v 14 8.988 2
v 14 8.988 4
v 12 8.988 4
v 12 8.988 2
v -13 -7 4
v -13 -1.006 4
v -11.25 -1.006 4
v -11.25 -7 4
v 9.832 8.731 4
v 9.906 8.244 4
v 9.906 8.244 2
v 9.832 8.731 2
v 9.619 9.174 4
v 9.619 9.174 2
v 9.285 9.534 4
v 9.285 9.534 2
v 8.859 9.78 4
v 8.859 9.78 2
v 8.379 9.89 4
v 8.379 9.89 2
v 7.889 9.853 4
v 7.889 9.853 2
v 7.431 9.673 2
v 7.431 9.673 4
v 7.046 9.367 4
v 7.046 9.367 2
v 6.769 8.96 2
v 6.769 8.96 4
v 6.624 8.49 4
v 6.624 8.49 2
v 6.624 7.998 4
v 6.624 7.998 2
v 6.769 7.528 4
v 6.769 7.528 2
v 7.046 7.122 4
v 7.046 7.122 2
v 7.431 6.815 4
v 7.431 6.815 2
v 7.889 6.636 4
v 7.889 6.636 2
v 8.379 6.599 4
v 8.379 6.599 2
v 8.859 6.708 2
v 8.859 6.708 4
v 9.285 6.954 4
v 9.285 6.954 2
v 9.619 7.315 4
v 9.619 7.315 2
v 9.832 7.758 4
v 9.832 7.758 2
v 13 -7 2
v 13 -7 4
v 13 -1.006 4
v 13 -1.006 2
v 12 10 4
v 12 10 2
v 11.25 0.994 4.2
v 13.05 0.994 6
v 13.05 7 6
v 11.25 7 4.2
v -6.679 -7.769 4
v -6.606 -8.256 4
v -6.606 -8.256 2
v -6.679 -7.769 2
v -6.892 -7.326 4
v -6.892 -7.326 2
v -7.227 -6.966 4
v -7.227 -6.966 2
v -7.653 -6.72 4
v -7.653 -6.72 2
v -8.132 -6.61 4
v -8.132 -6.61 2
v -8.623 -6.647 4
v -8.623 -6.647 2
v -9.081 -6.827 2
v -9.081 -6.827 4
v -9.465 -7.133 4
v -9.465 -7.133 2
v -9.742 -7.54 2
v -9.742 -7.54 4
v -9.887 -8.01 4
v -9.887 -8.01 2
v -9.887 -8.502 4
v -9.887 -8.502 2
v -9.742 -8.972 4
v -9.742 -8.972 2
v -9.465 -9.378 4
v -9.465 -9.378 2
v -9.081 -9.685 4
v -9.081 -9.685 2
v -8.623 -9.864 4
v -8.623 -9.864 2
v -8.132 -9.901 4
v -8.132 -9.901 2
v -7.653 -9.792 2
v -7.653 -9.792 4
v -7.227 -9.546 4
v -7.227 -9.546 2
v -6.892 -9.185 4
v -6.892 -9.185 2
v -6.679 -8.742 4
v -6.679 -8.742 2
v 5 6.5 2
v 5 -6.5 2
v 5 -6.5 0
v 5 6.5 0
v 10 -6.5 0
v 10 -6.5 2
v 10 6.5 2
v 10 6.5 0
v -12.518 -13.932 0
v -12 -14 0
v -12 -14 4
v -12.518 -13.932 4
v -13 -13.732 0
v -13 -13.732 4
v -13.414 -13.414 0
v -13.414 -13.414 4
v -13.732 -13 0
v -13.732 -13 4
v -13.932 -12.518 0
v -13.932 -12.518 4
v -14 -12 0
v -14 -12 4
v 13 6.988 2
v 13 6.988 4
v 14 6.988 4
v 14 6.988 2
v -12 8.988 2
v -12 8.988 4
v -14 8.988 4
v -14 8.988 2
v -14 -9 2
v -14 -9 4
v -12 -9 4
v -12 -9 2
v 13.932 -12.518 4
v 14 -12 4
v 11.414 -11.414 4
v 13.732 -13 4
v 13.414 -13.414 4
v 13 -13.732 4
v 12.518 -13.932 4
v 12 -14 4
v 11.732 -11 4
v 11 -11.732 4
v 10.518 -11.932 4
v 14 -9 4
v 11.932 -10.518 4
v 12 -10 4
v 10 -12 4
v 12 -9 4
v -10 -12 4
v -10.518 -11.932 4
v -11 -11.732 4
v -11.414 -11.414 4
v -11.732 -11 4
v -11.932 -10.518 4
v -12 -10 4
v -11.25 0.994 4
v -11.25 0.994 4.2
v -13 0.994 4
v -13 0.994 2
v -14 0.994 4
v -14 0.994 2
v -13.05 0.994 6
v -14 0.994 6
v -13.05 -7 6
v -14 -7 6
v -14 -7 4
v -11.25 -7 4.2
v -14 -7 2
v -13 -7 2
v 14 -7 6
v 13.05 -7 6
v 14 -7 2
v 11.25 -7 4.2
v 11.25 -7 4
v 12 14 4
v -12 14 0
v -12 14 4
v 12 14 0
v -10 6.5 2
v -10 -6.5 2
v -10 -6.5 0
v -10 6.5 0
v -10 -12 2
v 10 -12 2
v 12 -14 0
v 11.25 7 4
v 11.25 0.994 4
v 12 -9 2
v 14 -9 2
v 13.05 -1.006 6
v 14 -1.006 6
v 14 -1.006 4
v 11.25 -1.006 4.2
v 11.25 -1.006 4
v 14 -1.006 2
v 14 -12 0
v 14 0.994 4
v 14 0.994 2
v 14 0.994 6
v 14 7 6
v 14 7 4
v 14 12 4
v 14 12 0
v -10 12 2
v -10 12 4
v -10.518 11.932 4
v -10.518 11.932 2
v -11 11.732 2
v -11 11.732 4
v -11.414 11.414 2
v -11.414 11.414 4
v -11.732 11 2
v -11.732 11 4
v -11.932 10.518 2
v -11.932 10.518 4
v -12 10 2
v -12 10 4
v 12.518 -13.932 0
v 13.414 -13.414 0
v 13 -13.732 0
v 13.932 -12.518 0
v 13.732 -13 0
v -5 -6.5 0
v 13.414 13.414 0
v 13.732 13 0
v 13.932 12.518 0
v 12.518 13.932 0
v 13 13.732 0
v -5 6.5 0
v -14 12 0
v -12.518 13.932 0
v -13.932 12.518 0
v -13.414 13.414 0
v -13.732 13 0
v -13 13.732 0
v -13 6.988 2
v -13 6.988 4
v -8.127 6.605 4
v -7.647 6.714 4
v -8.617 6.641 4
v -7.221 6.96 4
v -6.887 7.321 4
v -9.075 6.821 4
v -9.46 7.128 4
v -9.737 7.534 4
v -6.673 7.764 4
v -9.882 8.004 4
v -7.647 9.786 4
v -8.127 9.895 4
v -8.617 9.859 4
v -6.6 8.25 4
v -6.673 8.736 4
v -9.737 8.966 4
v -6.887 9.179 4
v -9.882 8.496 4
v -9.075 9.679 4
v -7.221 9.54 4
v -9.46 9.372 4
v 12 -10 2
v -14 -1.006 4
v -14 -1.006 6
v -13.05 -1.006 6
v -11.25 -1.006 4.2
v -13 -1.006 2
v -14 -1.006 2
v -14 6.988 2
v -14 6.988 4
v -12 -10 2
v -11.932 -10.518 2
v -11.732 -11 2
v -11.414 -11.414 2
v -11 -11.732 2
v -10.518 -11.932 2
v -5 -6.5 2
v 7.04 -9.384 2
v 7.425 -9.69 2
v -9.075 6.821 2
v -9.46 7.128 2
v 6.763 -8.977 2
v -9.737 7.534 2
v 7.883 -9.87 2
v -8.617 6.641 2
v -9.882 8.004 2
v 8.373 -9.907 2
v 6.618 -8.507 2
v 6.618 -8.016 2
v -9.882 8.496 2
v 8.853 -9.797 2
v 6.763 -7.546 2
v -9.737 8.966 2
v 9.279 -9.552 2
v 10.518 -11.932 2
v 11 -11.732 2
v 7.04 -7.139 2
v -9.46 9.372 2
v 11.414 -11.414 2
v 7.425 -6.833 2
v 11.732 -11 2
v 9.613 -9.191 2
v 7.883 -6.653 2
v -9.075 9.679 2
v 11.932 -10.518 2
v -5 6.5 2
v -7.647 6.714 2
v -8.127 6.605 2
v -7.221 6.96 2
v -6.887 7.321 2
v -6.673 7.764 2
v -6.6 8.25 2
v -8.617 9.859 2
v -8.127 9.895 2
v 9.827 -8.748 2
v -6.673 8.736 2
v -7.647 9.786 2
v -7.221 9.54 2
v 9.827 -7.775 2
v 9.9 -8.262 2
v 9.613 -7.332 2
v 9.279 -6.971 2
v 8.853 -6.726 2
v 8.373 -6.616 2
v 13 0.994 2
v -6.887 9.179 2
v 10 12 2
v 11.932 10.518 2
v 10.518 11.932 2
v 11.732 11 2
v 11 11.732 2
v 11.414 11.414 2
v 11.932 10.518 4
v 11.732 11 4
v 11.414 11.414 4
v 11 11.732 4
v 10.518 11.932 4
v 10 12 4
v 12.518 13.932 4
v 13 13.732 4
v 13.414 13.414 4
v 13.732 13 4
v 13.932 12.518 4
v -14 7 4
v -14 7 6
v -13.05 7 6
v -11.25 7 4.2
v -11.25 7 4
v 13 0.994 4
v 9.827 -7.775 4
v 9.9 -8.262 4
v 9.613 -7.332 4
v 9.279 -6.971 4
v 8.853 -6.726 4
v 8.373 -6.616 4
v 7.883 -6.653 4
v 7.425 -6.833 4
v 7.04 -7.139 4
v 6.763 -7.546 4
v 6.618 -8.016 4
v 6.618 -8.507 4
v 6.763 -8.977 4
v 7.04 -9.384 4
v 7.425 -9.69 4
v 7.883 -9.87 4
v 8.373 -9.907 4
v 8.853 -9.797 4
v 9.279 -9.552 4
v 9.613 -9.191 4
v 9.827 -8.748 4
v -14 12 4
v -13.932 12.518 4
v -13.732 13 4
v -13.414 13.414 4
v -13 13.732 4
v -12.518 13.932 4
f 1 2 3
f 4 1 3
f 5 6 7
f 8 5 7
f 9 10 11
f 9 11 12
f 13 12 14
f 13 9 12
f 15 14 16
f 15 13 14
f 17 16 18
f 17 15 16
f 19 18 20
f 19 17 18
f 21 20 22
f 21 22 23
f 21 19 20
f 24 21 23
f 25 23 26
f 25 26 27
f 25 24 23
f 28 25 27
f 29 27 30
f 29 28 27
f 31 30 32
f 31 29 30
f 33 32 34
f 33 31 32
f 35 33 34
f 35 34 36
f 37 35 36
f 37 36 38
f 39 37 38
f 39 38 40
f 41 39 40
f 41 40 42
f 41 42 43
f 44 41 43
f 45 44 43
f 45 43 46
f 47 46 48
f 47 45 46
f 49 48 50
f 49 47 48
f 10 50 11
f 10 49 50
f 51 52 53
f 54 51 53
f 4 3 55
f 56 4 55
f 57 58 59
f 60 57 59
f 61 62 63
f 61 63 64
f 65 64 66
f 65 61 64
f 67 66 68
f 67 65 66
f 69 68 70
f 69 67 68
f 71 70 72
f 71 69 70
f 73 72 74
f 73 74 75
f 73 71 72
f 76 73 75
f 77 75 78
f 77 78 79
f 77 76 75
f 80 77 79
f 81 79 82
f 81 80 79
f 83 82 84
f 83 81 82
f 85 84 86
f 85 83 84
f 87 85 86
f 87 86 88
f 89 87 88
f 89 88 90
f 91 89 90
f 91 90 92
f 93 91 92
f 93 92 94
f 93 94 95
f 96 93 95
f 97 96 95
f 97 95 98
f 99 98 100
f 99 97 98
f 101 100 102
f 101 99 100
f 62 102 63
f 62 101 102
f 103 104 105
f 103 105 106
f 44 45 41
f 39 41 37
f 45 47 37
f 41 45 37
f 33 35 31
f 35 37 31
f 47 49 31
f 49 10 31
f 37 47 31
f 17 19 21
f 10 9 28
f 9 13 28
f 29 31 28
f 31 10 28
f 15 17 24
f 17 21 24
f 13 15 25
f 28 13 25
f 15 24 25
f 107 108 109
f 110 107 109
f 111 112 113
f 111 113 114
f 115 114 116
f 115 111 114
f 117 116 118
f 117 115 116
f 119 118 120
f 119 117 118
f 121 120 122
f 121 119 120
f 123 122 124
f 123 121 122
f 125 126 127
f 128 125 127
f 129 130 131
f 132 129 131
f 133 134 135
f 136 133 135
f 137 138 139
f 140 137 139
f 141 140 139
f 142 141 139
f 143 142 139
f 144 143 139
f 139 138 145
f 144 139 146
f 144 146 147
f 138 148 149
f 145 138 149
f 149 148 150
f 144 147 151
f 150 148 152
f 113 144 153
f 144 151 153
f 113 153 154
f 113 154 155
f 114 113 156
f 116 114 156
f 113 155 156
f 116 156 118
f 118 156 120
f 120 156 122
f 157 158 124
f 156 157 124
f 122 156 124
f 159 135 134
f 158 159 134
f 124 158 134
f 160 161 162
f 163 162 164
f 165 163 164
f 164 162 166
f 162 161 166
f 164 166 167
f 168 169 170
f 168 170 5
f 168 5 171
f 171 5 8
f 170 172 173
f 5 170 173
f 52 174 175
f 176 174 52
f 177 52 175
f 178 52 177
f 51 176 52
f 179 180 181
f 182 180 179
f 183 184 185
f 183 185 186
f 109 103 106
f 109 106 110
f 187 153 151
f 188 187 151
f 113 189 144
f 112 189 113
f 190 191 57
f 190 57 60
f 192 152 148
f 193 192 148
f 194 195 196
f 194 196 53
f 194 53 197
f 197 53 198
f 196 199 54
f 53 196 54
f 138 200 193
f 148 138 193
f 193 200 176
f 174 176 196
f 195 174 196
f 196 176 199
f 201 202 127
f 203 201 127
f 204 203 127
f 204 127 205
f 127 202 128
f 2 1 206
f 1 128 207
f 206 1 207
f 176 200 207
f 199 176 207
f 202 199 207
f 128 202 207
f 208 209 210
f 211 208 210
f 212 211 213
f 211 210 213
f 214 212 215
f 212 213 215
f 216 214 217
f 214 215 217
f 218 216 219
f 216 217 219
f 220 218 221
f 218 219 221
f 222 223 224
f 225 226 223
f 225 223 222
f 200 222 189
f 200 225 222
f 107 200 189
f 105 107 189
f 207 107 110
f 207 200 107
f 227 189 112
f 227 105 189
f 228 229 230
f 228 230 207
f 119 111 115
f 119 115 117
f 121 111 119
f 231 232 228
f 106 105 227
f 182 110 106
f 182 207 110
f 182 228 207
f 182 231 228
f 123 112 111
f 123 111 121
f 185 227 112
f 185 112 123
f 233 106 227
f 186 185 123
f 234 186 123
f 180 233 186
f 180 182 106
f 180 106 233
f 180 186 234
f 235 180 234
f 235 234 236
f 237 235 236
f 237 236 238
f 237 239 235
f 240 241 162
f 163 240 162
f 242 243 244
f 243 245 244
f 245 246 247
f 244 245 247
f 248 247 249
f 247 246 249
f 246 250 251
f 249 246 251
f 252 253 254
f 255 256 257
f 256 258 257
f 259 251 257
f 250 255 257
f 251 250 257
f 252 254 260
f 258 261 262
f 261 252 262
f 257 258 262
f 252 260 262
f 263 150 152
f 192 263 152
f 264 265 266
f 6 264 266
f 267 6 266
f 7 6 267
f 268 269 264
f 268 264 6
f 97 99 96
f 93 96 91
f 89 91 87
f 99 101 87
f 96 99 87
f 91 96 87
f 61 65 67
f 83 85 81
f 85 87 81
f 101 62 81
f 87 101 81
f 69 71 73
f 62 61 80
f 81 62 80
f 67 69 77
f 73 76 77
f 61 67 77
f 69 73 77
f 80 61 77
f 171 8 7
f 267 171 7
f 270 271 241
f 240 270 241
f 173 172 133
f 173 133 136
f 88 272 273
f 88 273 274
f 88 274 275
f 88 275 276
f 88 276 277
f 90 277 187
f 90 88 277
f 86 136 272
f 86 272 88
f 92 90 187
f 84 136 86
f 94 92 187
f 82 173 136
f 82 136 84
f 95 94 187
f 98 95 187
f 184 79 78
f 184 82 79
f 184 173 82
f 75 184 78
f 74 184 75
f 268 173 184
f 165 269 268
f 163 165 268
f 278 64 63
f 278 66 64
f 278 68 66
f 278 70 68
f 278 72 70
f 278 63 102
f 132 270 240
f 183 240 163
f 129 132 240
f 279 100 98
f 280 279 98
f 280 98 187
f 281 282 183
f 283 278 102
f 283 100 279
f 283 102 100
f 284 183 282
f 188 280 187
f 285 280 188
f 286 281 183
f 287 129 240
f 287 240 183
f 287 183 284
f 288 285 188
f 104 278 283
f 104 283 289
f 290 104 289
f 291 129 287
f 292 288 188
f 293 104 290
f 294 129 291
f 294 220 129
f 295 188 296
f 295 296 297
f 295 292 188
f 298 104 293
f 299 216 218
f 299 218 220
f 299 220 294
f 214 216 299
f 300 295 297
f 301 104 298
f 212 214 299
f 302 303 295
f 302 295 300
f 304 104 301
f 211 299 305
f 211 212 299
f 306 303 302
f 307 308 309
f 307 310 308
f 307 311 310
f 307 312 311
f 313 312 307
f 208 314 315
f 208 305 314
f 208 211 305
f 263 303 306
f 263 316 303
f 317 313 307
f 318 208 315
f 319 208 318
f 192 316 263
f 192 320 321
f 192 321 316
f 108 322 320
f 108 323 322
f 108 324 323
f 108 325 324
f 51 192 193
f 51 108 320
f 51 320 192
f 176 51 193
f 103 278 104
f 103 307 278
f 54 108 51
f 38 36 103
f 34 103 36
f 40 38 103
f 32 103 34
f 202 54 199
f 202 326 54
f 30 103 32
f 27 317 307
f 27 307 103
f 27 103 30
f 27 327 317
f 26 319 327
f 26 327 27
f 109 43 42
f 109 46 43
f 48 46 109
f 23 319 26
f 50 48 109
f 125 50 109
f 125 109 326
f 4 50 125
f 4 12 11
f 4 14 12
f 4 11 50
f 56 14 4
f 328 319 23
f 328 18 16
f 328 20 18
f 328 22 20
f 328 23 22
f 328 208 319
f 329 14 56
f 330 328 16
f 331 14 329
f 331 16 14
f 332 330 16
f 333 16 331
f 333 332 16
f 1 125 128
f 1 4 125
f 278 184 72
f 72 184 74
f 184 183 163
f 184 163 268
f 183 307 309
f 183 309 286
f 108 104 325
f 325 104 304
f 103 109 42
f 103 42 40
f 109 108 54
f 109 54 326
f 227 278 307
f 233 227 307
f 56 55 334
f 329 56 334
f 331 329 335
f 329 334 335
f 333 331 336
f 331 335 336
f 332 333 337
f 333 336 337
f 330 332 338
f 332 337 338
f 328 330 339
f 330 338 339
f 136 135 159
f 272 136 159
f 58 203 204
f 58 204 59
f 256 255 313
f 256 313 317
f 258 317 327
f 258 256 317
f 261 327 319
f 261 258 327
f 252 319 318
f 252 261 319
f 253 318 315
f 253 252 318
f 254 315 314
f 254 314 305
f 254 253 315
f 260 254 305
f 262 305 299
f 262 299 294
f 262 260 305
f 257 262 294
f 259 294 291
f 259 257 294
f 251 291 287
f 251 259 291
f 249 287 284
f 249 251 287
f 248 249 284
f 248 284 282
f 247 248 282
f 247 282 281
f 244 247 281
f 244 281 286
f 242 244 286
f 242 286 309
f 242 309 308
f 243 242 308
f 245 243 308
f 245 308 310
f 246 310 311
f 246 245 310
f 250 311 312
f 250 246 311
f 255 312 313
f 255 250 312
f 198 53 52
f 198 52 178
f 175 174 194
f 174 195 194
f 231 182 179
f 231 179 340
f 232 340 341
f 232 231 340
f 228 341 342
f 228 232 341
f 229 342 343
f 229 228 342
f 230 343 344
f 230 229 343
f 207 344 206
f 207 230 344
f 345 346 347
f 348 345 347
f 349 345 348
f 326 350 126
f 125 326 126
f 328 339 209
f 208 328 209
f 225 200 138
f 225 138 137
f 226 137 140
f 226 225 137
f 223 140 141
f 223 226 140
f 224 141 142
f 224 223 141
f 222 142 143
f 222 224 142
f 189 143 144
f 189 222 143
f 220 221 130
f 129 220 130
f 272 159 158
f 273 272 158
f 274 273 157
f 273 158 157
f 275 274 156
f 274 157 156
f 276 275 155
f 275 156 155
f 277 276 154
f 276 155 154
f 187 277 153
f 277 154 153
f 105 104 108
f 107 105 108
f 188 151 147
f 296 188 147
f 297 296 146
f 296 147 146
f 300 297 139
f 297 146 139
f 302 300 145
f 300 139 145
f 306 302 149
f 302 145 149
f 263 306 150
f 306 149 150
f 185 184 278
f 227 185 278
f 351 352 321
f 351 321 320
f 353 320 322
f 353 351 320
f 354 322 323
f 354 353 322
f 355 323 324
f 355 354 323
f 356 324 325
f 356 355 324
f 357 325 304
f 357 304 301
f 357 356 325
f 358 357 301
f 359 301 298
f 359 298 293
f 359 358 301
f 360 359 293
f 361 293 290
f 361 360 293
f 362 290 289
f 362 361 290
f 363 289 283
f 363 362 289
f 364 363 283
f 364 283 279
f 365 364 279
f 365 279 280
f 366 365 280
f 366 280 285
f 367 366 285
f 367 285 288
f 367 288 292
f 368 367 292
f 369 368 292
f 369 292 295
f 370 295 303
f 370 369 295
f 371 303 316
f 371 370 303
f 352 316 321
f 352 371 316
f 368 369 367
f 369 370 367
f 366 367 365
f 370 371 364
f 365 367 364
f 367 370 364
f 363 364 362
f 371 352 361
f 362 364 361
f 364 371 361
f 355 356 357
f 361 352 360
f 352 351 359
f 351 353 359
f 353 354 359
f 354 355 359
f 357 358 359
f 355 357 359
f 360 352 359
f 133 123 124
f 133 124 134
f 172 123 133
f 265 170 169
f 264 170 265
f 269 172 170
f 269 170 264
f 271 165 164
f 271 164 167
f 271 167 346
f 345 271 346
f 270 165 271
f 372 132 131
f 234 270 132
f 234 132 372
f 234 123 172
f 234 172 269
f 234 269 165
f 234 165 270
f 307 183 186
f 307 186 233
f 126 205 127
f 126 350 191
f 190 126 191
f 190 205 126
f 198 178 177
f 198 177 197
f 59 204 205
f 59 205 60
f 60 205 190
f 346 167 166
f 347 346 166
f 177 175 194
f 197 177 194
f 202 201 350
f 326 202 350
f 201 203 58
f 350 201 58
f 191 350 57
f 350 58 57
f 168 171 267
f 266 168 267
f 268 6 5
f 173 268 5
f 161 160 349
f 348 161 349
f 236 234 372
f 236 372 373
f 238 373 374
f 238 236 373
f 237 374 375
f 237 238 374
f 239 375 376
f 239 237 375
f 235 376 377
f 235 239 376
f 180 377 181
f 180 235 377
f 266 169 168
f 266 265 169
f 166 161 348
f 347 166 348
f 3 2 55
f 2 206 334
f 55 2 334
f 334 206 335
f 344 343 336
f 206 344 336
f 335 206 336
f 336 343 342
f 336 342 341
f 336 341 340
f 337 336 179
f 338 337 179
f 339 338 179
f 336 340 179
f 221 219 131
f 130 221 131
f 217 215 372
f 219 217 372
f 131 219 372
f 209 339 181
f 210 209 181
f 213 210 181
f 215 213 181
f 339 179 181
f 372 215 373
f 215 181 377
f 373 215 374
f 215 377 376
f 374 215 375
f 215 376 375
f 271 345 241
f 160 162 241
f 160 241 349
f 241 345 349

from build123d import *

# Parameters (mm, degrees)
BOSS_EXTRU_1_DEPTH           = 4
ESQUISSE2_R                  = 1.65
ENL_V_MAT_EXTRU_1_DEPTH      = 2
ESQUISSE3_W                  = 5
ESQUISSE3_H                  = 13
ENL_V_MAT_EXTRU_2_DEPTH      = 20.899748742
ESQUISSE4_W                  = 2.75
ESQUISSE4_H                  = 5.994249795
ESQUISSE4_H_2                = 6.005750205
BOSS_EXTRU_2_DEPTH           = 2
CHANFREIN3_SIZE              = 1.8
CHANFREIN3_OF_SYM_TRIE1_SIZE = 1.8


with BuildPart() as part:
    # Esquisse1 → Boss.-Extru.1 (new body)
    with BuildSketch(Plane.XY):
        with BuildLine():
            Line((12, -14), (-12, -14))
            ThreePointArc((-12, -14), (-13.414213562, -13.414213562), (-14, -12))
            Line((-14, -12), (-14, 12))
            ThreePointArc((-14, 12), (-13.414213562, 13.414213562), (-12, 14))
            Line((-12, 14), (12, 14))
            ThreePointArc((12, 14), (13.414213562, 13.414213562), (14, 12))
            Line((14, 12), (14, -12))
            ThreePointArc((14, -12), (13.414213562, -13.414213562), (12, -14))
        make_face()
    extrude(amount=BOSS_EXTRU_1_DEPTH)

    # Esquisse2 → Enlèv. mat.-Extru.1 (cut)
    with BuildSketch(Plane.XY.offset(4)):
        with BuildLine():
            Line((-10, -12), (10, -12))
            ThreePointArc((10, -12), (11.414213562, -11.414213562), (12, -10))
            Line((12, -10), (12, -9))
            Line((12, -9), (14, -9))
            Line((14, -9), (14, -7))
            Line((14, -7), (13, -7))
            Line((13, -7), (13, -1.005750205))
            Line((13, -1.005750205), (14, -1.005750205))
            Line((14, -1.005750205), (14, 0.994249795))
            Line((14, 0.994249795), (13, 0.994249795))
            Line((13, 0.994249795), (13, 6.988499589))
            Line((13, 6.988499589), (14, 6.988499589))
            Line((14, 6.988499589), (14, 8.988499589))
            Line((14, 8.988499589), (12, 8.988499589))
            Line((12, 8.988499589), (12, 10))
            ThreePointArc((12, 10), (11.414213562, 11.414213562), (10, 12))
            Line((10, 12), (-10, 12))
            ThreePointArc((-10, 12), (-11.414213562, 11.414213562), (-12, 10))
            Line((-12, 10), (-12, 8.988499589))
            Line((-12, 8.988499589), (-14, 8.988499589))
            Line((-14, 8.988499589), (-14, 6.988499589))
            Line((-14, 6.988499589), (-13, 6.988499589))
            Line((-13, 6.988499589), (-13, 0.994249795))
            Line((-13, 0.994249795), (-14, 0.994249795))
            Line((-14, 0.994249795), (-14, -1.005750205))
            Line((-14, -1.005750205), (-13, -1.005750205))
            Line((-13, -1.005750205), (-13, -7))
            Line((-13, -7), (-14, -7))
            Line((-14, -7), (-14, -9))
            Line((-14, -9), (-12, -9))
            Line((-12, -9), (-12, -10))
            ThreePointArc((-12, -10), (-11.414213562, -11.414213562), (-10, -12))
        make_face()
        with Locations((-8.25, 8.25)):
            Circle(ESQUISSE2_R, mode=Mode.SUBTRACT)
        with Locations((8.255750205, 8.244249795)):
            Circle(ESQUISSE2_R, mode=Mode.SUBTRACT)
        with Locations((8.25, -8.261500411)):
            Circle(ESQUISSE2_R, mode=Mode.SUBTRACT)
        with Locations((-8.255750205, -8.255750205)):
            Circle(ESQUISSE2_R, mode=Mode.SUBTRACT)
    extrude(amount=-ENL_V_MAT_EXTRU_1_DEPTH, mode=Mode.SUBTRACT)

    # Esquisse3 → Enlèv. mat.-Extru.2 (cut, through all)
    with BuildSketch(Plane.XY.offset(2)):
        with Locations((-7.5, 0)):
            Rectangle(ESQUISSE3_W, ESQUISSE3_H)
        with Locations((7.5, 0)):
            Rectangle(ESQUISSE3_W, ESQUISSE3_H)
    extrude(amount=-ENL_V_MAT_EXTRU_2_DEPTH, mode=Mode.SUBTRACT)

    # Esquisse4 → Boss.-Extru.2 (add)
    with BuildSketch(Plane.XY.offset(4)):
        with Locations((-12.625, -4.002875103)):
            Rectangle(ESQUISSE4_W, ESQUISSE4_H)
        with Locations((-12.625, 3.997124897)):
            Rectangle(ESQUISSE4_W, ESQUISSE4_H_2)
    boss_extru_2 = extrude(amount=BOSS_EXTRU_2_DEPTH)

    # Chanfrein3
    chanfrein3_edges = [part.edges().sort_by_distance(p)[0] for p in [
        (-11.25, 3.997124897, 6),
        (-11.25, -4.002875103, 6),
    ]]
    chamfer(chanfrein3_edges, length=CHANFREIN3_SIZE)

    # Symétrie1: Boss.-Extru.2 across plane
    add(boss_extru_2.mirror(Plane(origin=(0, 0, 0), x_dir=(0, 0, 1), z_dir=(1, 0, 0))))

    # Chanfrein3 of Symétrie1
    chanfrein3_of_sym_trie1_edges = [part.edges().sort_by_distance(p)[0] for p in [
        (11.25, 3.997124897, 6),
        (11.25, -4.002875103, 6),
    ]]
    chamfer(chanfrein3_of_sym_trie1_edges, length=CHANFREIN3_OF_SYM_TRIE1_SIZE)


solid = part.part
